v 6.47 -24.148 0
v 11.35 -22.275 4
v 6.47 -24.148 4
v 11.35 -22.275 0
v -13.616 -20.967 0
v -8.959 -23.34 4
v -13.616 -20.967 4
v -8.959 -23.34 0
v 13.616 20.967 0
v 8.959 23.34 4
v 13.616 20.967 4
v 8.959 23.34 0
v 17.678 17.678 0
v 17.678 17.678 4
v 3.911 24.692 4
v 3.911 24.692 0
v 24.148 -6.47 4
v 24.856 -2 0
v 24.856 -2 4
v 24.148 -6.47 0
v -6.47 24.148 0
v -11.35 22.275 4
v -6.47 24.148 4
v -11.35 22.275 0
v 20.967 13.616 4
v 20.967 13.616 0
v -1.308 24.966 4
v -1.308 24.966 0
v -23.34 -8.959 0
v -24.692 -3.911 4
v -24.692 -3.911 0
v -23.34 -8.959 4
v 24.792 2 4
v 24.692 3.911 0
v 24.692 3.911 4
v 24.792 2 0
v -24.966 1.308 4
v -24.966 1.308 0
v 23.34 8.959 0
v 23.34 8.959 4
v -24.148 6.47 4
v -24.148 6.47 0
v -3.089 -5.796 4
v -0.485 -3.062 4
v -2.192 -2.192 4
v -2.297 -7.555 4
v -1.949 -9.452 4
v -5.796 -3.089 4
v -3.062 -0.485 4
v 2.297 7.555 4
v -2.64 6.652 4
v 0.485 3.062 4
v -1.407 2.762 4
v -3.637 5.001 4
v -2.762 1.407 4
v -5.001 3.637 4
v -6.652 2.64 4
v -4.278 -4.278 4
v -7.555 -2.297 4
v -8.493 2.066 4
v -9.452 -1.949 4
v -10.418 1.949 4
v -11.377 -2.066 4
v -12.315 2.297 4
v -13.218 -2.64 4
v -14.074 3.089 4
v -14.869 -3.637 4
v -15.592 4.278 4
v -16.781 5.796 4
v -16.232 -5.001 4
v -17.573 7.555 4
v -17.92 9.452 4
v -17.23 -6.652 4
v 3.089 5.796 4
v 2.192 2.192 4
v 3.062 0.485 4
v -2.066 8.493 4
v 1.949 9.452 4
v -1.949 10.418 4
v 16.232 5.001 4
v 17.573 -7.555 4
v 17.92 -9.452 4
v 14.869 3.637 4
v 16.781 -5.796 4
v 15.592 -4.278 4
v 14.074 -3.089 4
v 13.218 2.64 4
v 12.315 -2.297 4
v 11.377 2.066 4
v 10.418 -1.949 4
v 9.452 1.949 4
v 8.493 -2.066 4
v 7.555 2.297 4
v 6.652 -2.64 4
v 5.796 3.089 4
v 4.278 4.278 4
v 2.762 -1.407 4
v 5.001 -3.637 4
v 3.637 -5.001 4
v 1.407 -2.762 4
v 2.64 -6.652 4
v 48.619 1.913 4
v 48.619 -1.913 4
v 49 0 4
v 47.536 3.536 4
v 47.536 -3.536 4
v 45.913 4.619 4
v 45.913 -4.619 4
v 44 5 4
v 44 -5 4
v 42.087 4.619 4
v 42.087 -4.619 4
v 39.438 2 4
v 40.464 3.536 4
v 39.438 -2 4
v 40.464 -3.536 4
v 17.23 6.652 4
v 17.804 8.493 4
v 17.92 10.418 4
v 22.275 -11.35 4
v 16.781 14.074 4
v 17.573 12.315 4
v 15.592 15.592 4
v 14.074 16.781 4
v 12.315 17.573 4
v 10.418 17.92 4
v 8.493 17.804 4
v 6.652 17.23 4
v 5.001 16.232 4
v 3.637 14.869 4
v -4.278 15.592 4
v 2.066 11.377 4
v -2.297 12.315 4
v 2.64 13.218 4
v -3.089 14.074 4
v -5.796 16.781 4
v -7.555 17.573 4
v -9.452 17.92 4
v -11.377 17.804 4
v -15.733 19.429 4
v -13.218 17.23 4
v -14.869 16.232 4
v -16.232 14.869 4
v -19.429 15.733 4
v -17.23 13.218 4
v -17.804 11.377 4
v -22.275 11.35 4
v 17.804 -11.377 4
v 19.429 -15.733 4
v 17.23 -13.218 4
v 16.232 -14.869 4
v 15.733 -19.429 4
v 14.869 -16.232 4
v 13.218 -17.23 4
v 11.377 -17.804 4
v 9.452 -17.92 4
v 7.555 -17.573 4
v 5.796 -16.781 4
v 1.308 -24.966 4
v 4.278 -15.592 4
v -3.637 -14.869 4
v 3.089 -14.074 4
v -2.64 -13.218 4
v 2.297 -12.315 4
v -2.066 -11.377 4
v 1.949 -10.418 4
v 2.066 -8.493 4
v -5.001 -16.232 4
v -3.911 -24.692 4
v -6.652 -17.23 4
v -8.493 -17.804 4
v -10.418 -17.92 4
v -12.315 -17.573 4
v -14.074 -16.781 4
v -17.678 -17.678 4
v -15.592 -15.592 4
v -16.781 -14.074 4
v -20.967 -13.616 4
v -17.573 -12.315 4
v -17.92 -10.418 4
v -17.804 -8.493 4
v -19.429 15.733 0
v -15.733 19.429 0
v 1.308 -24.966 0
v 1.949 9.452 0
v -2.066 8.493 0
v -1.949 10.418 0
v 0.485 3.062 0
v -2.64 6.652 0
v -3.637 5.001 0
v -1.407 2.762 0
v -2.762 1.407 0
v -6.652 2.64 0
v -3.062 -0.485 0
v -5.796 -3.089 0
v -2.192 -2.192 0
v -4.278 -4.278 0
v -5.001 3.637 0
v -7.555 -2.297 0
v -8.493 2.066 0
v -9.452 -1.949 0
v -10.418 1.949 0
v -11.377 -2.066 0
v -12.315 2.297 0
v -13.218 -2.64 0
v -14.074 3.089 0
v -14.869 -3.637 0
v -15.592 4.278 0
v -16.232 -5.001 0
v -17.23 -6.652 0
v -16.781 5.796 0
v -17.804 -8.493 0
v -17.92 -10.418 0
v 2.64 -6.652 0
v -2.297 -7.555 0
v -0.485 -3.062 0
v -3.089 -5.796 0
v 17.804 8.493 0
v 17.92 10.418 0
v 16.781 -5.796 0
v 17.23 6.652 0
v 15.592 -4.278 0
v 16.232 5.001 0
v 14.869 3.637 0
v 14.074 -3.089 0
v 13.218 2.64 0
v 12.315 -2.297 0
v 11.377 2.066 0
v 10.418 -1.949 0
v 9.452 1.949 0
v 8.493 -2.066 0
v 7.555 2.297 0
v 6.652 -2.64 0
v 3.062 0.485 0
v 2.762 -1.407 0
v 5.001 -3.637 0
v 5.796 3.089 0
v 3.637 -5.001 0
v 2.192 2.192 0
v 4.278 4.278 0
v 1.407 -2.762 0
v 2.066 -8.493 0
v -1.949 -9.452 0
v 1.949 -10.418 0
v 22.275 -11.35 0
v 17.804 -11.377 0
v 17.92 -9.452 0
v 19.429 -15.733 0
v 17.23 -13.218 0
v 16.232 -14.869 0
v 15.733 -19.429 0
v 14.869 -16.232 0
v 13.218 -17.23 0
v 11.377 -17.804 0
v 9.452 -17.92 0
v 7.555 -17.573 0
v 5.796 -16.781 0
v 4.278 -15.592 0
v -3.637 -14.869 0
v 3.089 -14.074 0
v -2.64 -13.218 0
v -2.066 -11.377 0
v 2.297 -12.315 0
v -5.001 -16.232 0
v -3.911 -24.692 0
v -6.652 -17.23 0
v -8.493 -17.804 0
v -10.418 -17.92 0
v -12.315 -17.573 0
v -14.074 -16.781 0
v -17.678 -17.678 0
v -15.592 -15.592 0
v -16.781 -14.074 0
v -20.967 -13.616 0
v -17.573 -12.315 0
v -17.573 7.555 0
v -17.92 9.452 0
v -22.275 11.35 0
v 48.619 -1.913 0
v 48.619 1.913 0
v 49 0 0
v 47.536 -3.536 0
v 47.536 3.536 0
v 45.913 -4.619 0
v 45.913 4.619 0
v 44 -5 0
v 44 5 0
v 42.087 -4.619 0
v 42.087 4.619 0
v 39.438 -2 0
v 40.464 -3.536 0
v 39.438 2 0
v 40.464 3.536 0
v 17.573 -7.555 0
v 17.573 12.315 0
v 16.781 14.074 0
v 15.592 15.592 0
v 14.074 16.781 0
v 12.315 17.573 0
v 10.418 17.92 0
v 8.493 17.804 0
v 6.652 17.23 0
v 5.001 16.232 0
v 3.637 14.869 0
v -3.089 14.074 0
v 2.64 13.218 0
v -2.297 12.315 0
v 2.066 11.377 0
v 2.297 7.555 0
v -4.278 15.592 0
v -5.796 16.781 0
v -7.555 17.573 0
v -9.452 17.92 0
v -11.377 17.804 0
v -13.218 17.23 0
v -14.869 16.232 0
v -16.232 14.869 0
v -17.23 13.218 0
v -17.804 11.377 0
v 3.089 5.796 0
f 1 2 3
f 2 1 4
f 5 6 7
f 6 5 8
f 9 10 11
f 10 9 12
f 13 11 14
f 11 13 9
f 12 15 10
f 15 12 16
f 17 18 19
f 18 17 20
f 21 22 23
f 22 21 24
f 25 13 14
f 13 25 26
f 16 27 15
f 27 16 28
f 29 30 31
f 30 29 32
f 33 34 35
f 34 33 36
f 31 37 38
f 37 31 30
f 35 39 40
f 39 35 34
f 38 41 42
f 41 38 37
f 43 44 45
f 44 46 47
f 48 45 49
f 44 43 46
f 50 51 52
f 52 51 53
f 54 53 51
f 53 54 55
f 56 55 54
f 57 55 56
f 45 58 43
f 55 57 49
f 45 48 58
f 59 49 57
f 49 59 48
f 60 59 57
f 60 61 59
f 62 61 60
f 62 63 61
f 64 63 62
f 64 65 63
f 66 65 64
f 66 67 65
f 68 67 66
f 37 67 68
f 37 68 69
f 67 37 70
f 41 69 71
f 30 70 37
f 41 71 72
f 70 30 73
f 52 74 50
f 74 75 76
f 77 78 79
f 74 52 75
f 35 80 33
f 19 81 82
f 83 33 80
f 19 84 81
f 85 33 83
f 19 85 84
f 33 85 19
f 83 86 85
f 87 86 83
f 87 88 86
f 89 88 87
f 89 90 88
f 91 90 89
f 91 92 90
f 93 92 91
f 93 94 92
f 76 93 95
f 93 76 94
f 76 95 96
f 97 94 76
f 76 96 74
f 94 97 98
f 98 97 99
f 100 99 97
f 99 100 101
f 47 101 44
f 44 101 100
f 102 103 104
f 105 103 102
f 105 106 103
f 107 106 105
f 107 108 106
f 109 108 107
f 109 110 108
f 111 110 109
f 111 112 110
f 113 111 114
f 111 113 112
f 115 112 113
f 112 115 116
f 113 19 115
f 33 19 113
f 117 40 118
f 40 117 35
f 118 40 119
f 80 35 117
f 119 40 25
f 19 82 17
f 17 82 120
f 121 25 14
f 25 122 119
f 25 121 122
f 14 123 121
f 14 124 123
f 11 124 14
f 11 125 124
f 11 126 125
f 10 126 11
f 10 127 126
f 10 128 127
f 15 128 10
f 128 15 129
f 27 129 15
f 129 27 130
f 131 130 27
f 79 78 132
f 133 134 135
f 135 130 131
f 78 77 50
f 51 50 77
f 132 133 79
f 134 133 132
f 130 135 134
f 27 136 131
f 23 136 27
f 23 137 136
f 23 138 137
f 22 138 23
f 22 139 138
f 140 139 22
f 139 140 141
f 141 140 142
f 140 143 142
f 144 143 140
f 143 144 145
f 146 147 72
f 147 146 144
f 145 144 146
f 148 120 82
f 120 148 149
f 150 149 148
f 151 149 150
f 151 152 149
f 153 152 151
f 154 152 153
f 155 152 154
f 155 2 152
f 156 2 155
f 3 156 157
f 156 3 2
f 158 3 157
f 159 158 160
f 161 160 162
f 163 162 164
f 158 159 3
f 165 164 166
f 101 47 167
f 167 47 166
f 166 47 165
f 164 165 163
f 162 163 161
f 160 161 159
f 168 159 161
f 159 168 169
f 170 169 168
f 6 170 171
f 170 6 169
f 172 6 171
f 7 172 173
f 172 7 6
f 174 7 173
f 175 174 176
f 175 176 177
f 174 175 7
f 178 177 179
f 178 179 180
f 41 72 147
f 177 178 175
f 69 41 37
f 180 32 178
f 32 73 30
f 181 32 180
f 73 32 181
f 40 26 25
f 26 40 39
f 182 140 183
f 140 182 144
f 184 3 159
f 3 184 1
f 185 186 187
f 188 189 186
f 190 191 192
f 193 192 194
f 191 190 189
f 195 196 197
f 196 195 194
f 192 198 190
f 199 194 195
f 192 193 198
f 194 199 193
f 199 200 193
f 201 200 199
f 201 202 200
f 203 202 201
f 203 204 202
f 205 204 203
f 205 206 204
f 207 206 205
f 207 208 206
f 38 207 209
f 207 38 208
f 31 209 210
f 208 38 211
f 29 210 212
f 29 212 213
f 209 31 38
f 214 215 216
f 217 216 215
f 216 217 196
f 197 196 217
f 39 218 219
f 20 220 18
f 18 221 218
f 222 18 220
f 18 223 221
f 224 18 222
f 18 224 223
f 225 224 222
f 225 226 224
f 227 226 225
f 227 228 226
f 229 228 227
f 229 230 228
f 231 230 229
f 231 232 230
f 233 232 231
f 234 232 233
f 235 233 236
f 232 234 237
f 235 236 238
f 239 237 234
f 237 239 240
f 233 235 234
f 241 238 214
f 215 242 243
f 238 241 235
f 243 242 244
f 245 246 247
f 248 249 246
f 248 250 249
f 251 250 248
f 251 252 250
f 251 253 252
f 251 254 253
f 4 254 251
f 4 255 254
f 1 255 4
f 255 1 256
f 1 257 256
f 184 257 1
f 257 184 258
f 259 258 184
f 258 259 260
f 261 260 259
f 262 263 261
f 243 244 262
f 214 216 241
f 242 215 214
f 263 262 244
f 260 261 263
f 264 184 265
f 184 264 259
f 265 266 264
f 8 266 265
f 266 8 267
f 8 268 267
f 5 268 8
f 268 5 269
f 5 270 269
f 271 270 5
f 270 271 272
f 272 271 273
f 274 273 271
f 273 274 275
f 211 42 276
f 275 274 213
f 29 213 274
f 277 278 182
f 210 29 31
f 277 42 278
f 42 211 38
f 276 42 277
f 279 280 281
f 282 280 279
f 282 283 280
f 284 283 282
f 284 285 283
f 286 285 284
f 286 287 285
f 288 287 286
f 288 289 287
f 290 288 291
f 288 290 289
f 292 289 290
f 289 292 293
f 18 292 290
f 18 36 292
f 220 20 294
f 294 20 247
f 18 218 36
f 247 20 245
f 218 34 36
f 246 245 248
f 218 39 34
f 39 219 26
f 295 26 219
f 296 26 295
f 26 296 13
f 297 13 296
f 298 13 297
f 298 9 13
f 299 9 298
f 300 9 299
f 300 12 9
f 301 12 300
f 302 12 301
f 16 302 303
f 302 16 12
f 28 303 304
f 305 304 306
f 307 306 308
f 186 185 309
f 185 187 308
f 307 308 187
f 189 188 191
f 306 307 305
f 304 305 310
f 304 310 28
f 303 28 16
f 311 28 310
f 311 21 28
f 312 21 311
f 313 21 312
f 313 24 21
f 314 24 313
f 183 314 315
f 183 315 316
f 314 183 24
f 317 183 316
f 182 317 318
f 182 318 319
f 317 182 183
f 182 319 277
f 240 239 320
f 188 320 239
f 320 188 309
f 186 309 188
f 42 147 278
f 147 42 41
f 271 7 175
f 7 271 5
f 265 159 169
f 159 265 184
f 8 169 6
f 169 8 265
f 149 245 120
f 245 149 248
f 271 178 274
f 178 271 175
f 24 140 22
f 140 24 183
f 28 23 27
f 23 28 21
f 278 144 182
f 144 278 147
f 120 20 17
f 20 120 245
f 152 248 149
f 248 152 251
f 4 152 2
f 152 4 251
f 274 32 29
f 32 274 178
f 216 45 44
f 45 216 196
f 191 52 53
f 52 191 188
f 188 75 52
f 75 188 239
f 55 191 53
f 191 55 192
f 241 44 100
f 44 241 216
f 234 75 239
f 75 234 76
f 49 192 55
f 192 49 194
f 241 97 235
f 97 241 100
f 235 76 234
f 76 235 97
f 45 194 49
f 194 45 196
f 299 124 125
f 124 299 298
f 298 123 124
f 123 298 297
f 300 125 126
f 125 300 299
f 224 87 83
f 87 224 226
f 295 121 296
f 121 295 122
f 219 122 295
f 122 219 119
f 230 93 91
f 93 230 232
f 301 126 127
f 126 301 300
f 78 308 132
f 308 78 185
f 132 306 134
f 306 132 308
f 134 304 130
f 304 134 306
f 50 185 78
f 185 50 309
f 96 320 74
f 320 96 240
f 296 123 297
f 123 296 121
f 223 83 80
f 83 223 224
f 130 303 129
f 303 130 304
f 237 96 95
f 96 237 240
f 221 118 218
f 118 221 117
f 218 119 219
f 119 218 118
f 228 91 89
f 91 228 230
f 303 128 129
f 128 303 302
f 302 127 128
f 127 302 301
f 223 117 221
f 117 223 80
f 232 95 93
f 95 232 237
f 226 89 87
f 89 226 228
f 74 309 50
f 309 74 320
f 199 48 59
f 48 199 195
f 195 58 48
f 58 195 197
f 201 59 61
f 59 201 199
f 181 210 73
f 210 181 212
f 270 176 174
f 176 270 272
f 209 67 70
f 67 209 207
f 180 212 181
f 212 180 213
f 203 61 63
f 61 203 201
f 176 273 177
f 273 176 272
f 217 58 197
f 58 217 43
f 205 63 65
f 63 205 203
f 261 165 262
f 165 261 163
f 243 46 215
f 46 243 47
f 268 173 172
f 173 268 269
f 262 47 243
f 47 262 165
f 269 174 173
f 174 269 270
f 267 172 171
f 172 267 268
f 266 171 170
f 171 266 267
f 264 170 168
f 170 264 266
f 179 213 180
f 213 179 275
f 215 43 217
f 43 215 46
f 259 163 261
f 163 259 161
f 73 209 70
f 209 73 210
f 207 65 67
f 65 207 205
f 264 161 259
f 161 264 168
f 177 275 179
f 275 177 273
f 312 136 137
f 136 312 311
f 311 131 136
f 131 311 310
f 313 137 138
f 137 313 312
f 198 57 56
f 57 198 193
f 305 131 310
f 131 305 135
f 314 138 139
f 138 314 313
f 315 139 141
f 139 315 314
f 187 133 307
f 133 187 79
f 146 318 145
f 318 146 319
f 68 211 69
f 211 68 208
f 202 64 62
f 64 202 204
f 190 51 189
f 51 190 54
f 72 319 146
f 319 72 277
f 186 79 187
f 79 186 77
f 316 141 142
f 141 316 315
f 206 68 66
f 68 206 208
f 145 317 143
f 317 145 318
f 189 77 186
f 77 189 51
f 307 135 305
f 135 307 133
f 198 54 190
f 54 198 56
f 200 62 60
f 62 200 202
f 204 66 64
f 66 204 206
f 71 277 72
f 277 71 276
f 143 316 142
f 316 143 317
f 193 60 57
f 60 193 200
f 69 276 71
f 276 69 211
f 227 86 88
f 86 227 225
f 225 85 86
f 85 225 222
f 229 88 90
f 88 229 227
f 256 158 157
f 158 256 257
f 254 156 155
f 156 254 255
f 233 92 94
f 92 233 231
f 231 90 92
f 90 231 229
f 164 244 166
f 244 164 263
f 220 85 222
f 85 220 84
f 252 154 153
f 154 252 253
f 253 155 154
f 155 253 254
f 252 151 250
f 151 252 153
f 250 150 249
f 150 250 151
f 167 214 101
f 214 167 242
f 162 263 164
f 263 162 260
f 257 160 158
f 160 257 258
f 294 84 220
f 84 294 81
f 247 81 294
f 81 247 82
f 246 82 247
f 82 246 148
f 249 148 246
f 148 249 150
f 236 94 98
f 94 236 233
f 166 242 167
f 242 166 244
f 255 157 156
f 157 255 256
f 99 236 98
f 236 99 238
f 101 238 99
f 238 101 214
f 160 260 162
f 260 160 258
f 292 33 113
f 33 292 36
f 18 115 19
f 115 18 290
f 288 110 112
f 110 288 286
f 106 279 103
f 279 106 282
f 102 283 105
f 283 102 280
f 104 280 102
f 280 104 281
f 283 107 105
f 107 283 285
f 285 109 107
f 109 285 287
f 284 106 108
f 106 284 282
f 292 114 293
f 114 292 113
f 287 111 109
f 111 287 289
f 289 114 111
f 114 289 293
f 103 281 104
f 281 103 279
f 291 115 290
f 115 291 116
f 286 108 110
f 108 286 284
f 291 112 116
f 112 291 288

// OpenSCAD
wheel_heigth = 4;
wheel_radius = 25;
wheel_shaft_radius = 3.1;
wheel_holes_radius = 8;

handle_length = 20;
handle_width = 4;
handle_knob_radius = 5;

offset = (wheel_radius-wheel_shaft_radius)/2 + wheel_shaft_radius;

union()
{
	translate([wheel_radius-1,-1*handle_width/2,0])
		cube([handle_length,handle_width,wheel_heigth]);

	translate([wheel_radius-1+handle_length,0,0])
		cylinder(r=handle_knob_radius,h=wheel_heigth);

	rotate(a=45, v=[0,0,1])
	{
		difference()
		{
			cylinder(r=wheel_radius,h=wheel_heigth);
			cylinder(r=wheel_shaft_radius,h=wheel_heigth);
			translate([offset,0,0])
				cylinder(r=wheel_holes_radius,h=wheel_heigth);
			translate([-1*offset,0,0])
				cylinder(r=wheel_holes_radius,h=wheel_heigth);
			translate([0,offset,0])
				cylinder(r=wheel_holes_radius,h=wheel_heigth);
			translate([0,-1*offset,0])
				cylinder(r=wheel_holes_radius,h=wheel_heigth);
		}
	}
}
